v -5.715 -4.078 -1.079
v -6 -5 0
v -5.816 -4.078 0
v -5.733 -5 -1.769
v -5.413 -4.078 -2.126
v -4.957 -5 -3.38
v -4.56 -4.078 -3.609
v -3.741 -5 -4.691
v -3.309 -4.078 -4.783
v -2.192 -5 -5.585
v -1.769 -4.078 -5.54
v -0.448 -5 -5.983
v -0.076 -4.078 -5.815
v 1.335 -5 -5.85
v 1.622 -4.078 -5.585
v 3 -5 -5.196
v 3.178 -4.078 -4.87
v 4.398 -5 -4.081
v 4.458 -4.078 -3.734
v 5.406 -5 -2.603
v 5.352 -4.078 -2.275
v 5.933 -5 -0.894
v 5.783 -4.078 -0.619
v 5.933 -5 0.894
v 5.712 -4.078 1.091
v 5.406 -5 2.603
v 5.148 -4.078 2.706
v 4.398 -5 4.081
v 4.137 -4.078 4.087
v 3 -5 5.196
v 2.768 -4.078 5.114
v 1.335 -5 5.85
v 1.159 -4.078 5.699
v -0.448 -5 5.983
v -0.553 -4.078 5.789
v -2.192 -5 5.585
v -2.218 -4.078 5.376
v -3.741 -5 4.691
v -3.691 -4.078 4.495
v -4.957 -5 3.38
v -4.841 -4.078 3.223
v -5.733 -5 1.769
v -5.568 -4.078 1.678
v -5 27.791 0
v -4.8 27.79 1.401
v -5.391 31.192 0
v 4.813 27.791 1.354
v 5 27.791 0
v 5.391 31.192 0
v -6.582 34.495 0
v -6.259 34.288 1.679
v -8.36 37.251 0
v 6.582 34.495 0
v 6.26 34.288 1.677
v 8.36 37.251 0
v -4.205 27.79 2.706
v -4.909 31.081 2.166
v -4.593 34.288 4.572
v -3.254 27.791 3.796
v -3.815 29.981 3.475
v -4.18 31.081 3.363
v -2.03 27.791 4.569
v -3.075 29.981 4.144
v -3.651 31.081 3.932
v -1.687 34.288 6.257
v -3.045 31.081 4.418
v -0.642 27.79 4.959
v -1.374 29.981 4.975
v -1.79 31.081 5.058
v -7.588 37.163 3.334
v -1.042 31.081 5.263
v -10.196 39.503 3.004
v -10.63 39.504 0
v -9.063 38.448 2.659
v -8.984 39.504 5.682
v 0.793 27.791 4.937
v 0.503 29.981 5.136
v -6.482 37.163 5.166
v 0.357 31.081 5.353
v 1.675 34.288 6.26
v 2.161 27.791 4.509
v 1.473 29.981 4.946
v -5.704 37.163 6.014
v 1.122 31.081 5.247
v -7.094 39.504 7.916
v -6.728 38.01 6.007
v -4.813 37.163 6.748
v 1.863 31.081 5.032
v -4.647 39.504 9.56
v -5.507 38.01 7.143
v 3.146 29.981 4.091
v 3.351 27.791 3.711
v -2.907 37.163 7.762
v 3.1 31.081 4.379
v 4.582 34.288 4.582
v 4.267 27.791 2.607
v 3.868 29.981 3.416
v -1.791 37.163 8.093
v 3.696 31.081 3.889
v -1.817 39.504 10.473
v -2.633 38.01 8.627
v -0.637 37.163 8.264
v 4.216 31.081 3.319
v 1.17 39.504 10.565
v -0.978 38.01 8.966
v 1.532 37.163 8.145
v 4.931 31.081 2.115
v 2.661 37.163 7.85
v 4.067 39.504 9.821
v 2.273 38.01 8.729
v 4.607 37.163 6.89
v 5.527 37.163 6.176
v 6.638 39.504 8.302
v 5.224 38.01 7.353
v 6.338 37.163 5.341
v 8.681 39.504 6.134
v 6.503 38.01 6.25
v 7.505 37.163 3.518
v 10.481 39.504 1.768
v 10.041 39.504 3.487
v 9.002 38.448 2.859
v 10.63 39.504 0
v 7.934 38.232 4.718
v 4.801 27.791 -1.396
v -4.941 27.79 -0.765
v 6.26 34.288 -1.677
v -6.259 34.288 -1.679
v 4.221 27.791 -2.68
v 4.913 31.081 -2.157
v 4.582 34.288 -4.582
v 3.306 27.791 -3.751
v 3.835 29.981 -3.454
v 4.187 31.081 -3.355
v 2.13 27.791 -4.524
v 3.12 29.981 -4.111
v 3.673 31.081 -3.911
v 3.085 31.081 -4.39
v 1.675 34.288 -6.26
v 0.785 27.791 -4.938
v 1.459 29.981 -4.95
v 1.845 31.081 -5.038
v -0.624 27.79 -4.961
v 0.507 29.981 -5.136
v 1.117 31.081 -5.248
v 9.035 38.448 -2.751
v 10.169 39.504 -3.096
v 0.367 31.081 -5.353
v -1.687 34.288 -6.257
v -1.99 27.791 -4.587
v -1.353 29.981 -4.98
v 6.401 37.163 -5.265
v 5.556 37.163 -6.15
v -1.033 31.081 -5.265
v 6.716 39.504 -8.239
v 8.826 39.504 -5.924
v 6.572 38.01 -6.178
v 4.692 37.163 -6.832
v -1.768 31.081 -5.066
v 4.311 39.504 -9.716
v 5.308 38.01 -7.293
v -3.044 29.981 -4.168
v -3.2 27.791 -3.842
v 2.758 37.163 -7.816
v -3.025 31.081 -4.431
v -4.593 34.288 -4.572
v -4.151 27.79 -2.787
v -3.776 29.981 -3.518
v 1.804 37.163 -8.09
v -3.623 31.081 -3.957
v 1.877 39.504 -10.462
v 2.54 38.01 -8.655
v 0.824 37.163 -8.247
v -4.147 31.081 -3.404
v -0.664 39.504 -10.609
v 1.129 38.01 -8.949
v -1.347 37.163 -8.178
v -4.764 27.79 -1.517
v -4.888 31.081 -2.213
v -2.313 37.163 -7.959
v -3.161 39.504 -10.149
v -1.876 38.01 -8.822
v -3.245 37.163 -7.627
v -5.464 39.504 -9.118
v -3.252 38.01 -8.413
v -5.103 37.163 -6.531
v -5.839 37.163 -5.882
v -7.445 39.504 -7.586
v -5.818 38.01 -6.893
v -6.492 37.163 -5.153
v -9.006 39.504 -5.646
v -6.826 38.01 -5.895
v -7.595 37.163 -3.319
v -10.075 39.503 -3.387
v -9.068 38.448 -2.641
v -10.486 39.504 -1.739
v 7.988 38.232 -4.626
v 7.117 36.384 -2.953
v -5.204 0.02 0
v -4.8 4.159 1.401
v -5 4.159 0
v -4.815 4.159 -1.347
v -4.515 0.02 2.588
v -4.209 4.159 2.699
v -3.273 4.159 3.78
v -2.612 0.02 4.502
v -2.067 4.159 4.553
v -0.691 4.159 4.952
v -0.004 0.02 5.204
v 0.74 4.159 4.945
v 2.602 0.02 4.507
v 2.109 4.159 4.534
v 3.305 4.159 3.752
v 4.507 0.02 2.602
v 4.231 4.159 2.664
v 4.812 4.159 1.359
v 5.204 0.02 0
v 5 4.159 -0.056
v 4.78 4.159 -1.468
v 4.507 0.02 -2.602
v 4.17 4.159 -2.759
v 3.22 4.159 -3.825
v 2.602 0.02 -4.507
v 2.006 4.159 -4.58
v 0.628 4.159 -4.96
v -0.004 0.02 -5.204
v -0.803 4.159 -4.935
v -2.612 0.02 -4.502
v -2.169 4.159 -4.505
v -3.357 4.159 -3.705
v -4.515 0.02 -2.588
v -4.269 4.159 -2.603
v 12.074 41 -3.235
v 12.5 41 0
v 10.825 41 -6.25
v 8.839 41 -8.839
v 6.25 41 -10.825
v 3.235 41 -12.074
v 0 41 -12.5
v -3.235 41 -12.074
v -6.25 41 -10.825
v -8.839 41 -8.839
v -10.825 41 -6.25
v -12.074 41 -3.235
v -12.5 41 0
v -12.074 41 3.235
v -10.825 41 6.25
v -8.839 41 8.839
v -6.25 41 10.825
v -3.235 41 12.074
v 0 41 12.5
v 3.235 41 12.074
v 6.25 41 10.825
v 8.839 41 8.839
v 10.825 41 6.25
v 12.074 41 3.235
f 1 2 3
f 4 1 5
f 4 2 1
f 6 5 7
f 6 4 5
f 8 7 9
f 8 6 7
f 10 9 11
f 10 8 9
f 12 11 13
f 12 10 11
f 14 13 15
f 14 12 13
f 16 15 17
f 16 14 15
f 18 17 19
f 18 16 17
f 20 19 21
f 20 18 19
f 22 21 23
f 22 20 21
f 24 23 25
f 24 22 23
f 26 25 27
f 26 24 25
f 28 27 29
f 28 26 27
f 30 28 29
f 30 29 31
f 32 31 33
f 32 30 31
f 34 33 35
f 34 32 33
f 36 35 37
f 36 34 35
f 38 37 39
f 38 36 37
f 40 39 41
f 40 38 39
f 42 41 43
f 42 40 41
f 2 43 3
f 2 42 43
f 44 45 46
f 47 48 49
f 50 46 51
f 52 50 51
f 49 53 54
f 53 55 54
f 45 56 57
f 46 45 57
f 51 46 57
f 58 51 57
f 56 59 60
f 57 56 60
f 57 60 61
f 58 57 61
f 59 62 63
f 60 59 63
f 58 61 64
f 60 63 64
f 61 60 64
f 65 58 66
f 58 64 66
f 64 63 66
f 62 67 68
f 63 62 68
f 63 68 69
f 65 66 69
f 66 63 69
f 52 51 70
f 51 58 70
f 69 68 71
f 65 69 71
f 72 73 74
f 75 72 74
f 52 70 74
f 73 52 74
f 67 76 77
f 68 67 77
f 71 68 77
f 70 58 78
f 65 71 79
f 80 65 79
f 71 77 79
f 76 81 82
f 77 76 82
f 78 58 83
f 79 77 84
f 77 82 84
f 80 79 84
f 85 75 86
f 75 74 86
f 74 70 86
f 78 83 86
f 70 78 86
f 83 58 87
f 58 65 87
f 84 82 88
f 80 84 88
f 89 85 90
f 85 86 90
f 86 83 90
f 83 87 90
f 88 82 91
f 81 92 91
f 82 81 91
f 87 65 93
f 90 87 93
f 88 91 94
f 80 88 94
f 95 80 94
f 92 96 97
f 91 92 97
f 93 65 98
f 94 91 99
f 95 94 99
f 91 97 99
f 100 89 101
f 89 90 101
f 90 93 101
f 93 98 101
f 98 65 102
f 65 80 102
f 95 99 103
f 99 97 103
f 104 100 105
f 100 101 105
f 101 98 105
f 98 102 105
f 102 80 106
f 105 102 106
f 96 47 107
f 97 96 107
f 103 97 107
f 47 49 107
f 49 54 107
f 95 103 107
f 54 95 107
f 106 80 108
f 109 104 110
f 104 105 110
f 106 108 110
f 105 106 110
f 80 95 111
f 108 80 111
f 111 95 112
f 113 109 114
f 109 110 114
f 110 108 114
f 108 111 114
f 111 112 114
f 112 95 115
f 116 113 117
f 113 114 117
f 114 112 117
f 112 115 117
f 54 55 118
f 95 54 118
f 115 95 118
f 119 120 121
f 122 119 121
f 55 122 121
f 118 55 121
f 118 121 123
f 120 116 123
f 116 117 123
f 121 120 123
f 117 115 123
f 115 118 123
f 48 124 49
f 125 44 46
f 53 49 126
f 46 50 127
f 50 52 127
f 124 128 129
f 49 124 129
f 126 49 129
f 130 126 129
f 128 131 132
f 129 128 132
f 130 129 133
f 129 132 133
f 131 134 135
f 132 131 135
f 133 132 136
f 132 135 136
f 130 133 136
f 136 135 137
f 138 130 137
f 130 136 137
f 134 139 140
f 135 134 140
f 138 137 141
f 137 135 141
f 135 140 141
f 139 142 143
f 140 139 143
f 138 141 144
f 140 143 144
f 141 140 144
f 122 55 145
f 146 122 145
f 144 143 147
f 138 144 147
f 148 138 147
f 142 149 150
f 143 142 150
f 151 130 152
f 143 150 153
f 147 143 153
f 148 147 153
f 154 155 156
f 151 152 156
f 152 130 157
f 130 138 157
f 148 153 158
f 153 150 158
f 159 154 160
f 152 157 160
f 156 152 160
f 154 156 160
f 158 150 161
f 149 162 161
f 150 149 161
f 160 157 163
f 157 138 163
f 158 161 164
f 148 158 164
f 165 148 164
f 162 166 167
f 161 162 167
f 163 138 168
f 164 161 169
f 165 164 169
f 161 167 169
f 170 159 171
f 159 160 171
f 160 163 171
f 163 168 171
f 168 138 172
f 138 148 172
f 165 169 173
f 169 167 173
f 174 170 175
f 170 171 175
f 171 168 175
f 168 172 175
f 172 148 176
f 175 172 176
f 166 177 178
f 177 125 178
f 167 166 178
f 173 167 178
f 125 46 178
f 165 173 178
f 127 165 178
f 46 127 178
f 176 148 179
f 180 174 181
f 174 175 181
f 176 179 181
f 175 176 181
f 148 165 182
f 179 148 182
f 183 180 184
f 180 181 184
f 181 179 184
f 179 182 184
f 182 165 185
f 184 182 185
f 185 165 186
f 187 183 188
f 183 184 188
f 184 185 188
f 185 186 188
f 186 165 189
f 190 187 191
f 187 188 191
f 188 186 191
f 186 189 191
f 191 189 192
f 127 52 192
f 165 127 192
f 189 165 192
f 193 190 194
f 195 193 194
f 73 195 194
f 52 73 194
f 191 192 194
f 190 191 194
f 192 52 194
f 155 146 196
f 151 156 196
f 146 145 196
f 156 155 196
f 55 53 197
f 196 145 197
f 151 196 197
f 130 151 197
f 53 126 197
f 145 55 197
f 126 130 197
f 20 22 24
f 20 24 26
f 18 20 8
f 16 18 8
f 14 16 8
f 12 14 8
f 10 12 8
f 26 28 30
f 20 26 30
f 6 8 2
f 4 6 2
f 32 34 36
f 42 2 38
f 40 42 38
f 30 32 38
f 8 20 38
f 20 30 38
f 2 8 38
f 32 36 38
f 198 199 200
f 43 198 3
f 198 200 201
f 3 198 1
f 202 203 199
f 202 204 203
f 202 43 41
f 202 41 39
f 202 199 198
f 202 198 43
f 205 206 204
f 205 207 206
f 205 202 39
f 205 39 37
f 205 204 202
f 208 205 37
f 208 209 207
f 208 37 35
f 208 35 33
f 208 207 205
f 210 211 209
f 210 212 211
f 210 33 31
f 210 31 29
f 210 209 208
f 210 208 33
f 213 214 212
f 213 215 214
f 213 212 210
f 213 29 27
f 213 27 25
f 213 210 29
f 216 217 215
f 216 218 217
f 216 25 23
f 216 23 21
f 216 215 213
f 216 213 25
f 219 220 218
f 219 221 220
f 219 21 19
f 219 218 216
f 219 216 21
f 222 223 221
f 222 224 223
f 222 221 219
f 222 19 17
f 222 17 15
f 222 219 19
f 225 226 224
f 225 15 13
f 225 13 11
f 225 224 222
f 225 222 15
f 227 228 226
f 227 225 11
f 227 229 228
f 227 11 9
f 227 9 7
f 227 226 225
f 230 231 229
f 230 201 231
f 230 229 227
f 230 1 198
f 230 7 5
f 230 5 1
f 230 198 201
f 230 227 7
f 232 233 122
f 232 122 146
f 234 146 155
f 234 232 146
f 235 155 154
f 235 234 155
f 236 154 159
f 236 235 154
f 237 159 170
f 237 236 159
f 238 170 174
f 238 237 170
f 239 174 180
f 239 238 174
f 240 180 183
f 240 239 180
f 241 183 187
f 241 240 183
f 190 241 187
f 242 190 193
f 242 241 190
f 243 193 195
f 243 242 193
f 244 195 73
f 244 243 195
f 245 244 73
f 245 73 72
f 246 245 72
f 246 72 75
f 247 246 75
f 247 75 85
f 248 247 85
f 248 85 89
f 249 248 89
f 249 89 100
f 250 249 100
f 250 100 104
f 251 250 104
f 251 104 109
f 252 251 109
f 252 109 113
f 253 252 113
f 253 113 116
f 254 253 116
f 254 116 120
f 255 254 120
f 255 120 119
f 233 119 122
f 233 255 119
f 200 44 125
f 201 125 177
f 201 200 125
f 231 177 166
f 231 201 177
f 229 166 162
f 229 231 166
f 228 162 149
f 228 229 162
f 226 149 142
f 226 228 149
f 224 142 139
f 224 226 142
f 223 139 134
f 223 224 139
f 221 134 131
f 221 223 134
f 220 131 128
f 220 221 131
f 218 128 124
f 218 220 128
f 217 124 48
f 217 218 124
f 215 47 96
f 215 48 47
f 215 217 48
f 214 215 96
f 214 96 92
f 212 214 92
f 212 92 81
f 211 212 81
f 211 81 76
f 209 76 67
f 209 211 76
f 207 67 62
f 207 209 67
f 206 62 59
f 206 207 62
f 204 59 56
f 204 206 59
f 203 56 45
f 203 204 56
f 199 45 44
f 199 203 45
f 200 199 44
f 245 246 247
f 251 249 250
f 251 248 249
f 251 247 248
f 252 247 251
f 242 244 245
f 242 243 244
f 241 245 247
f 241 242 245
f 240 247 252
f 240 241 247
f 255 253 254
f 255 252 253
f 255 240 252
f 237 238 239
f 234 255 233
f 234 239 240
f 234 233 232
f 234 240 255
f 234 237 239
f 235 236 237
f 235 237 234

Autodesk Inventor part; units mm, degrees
ref_plane "YZ Plane" through (0, 0, 0) normal (1, 0, 0) x (0, 1, 0)
ref_plane "XY Plane" through (0, 0, 0) normal (0, 0, 1) x (1, 0, 0)
sketch "Sketch1" plane through (0, 0, 0) normal (0, 1, 0) x (-1, 0, 0)
  circle A0 centre (0, 0) radius 5
  dimension "d0" = 10
extrude "Extrusion1" add sketch "Sketch1" along normal blind 35
ref_plane "Work Plane1" through (0, -5, 0) normal (0, 1, 0) x (-1, 0, 0)
sketch "Sketch4" plane through (0, -5, 0) normal (0, 1, 0) x (-1, 0, 0)
  circle A0 centre (0, 0) radius 6
  dimension "d8" = 12
loft "Loft1" add profiles "Sketch4" section 1 edges at (5, 0, 0)
ref_plane "Work Plane2" through (0, 41, 0) normal (0, 1, 0) x (1, 0, 0)
sketch "Sketch5" plane through (0, 41, 0) normal (0, 1, 0) x (1, 0, 0)
  circle A0 centre (0, 0) radius 12.5
  dimension "d14" = 25
loft "Loft2" add profiles "Sketch5" section 2 edges at (5, 35, 0)
fillet "Face Fillet1" radius 15 2 edges at (0, 35, -5) (0, 35, 5)
fillet "Face Fillet2" radius 42 1 edges at (5, 0, 0)
properties part number "table_column"
